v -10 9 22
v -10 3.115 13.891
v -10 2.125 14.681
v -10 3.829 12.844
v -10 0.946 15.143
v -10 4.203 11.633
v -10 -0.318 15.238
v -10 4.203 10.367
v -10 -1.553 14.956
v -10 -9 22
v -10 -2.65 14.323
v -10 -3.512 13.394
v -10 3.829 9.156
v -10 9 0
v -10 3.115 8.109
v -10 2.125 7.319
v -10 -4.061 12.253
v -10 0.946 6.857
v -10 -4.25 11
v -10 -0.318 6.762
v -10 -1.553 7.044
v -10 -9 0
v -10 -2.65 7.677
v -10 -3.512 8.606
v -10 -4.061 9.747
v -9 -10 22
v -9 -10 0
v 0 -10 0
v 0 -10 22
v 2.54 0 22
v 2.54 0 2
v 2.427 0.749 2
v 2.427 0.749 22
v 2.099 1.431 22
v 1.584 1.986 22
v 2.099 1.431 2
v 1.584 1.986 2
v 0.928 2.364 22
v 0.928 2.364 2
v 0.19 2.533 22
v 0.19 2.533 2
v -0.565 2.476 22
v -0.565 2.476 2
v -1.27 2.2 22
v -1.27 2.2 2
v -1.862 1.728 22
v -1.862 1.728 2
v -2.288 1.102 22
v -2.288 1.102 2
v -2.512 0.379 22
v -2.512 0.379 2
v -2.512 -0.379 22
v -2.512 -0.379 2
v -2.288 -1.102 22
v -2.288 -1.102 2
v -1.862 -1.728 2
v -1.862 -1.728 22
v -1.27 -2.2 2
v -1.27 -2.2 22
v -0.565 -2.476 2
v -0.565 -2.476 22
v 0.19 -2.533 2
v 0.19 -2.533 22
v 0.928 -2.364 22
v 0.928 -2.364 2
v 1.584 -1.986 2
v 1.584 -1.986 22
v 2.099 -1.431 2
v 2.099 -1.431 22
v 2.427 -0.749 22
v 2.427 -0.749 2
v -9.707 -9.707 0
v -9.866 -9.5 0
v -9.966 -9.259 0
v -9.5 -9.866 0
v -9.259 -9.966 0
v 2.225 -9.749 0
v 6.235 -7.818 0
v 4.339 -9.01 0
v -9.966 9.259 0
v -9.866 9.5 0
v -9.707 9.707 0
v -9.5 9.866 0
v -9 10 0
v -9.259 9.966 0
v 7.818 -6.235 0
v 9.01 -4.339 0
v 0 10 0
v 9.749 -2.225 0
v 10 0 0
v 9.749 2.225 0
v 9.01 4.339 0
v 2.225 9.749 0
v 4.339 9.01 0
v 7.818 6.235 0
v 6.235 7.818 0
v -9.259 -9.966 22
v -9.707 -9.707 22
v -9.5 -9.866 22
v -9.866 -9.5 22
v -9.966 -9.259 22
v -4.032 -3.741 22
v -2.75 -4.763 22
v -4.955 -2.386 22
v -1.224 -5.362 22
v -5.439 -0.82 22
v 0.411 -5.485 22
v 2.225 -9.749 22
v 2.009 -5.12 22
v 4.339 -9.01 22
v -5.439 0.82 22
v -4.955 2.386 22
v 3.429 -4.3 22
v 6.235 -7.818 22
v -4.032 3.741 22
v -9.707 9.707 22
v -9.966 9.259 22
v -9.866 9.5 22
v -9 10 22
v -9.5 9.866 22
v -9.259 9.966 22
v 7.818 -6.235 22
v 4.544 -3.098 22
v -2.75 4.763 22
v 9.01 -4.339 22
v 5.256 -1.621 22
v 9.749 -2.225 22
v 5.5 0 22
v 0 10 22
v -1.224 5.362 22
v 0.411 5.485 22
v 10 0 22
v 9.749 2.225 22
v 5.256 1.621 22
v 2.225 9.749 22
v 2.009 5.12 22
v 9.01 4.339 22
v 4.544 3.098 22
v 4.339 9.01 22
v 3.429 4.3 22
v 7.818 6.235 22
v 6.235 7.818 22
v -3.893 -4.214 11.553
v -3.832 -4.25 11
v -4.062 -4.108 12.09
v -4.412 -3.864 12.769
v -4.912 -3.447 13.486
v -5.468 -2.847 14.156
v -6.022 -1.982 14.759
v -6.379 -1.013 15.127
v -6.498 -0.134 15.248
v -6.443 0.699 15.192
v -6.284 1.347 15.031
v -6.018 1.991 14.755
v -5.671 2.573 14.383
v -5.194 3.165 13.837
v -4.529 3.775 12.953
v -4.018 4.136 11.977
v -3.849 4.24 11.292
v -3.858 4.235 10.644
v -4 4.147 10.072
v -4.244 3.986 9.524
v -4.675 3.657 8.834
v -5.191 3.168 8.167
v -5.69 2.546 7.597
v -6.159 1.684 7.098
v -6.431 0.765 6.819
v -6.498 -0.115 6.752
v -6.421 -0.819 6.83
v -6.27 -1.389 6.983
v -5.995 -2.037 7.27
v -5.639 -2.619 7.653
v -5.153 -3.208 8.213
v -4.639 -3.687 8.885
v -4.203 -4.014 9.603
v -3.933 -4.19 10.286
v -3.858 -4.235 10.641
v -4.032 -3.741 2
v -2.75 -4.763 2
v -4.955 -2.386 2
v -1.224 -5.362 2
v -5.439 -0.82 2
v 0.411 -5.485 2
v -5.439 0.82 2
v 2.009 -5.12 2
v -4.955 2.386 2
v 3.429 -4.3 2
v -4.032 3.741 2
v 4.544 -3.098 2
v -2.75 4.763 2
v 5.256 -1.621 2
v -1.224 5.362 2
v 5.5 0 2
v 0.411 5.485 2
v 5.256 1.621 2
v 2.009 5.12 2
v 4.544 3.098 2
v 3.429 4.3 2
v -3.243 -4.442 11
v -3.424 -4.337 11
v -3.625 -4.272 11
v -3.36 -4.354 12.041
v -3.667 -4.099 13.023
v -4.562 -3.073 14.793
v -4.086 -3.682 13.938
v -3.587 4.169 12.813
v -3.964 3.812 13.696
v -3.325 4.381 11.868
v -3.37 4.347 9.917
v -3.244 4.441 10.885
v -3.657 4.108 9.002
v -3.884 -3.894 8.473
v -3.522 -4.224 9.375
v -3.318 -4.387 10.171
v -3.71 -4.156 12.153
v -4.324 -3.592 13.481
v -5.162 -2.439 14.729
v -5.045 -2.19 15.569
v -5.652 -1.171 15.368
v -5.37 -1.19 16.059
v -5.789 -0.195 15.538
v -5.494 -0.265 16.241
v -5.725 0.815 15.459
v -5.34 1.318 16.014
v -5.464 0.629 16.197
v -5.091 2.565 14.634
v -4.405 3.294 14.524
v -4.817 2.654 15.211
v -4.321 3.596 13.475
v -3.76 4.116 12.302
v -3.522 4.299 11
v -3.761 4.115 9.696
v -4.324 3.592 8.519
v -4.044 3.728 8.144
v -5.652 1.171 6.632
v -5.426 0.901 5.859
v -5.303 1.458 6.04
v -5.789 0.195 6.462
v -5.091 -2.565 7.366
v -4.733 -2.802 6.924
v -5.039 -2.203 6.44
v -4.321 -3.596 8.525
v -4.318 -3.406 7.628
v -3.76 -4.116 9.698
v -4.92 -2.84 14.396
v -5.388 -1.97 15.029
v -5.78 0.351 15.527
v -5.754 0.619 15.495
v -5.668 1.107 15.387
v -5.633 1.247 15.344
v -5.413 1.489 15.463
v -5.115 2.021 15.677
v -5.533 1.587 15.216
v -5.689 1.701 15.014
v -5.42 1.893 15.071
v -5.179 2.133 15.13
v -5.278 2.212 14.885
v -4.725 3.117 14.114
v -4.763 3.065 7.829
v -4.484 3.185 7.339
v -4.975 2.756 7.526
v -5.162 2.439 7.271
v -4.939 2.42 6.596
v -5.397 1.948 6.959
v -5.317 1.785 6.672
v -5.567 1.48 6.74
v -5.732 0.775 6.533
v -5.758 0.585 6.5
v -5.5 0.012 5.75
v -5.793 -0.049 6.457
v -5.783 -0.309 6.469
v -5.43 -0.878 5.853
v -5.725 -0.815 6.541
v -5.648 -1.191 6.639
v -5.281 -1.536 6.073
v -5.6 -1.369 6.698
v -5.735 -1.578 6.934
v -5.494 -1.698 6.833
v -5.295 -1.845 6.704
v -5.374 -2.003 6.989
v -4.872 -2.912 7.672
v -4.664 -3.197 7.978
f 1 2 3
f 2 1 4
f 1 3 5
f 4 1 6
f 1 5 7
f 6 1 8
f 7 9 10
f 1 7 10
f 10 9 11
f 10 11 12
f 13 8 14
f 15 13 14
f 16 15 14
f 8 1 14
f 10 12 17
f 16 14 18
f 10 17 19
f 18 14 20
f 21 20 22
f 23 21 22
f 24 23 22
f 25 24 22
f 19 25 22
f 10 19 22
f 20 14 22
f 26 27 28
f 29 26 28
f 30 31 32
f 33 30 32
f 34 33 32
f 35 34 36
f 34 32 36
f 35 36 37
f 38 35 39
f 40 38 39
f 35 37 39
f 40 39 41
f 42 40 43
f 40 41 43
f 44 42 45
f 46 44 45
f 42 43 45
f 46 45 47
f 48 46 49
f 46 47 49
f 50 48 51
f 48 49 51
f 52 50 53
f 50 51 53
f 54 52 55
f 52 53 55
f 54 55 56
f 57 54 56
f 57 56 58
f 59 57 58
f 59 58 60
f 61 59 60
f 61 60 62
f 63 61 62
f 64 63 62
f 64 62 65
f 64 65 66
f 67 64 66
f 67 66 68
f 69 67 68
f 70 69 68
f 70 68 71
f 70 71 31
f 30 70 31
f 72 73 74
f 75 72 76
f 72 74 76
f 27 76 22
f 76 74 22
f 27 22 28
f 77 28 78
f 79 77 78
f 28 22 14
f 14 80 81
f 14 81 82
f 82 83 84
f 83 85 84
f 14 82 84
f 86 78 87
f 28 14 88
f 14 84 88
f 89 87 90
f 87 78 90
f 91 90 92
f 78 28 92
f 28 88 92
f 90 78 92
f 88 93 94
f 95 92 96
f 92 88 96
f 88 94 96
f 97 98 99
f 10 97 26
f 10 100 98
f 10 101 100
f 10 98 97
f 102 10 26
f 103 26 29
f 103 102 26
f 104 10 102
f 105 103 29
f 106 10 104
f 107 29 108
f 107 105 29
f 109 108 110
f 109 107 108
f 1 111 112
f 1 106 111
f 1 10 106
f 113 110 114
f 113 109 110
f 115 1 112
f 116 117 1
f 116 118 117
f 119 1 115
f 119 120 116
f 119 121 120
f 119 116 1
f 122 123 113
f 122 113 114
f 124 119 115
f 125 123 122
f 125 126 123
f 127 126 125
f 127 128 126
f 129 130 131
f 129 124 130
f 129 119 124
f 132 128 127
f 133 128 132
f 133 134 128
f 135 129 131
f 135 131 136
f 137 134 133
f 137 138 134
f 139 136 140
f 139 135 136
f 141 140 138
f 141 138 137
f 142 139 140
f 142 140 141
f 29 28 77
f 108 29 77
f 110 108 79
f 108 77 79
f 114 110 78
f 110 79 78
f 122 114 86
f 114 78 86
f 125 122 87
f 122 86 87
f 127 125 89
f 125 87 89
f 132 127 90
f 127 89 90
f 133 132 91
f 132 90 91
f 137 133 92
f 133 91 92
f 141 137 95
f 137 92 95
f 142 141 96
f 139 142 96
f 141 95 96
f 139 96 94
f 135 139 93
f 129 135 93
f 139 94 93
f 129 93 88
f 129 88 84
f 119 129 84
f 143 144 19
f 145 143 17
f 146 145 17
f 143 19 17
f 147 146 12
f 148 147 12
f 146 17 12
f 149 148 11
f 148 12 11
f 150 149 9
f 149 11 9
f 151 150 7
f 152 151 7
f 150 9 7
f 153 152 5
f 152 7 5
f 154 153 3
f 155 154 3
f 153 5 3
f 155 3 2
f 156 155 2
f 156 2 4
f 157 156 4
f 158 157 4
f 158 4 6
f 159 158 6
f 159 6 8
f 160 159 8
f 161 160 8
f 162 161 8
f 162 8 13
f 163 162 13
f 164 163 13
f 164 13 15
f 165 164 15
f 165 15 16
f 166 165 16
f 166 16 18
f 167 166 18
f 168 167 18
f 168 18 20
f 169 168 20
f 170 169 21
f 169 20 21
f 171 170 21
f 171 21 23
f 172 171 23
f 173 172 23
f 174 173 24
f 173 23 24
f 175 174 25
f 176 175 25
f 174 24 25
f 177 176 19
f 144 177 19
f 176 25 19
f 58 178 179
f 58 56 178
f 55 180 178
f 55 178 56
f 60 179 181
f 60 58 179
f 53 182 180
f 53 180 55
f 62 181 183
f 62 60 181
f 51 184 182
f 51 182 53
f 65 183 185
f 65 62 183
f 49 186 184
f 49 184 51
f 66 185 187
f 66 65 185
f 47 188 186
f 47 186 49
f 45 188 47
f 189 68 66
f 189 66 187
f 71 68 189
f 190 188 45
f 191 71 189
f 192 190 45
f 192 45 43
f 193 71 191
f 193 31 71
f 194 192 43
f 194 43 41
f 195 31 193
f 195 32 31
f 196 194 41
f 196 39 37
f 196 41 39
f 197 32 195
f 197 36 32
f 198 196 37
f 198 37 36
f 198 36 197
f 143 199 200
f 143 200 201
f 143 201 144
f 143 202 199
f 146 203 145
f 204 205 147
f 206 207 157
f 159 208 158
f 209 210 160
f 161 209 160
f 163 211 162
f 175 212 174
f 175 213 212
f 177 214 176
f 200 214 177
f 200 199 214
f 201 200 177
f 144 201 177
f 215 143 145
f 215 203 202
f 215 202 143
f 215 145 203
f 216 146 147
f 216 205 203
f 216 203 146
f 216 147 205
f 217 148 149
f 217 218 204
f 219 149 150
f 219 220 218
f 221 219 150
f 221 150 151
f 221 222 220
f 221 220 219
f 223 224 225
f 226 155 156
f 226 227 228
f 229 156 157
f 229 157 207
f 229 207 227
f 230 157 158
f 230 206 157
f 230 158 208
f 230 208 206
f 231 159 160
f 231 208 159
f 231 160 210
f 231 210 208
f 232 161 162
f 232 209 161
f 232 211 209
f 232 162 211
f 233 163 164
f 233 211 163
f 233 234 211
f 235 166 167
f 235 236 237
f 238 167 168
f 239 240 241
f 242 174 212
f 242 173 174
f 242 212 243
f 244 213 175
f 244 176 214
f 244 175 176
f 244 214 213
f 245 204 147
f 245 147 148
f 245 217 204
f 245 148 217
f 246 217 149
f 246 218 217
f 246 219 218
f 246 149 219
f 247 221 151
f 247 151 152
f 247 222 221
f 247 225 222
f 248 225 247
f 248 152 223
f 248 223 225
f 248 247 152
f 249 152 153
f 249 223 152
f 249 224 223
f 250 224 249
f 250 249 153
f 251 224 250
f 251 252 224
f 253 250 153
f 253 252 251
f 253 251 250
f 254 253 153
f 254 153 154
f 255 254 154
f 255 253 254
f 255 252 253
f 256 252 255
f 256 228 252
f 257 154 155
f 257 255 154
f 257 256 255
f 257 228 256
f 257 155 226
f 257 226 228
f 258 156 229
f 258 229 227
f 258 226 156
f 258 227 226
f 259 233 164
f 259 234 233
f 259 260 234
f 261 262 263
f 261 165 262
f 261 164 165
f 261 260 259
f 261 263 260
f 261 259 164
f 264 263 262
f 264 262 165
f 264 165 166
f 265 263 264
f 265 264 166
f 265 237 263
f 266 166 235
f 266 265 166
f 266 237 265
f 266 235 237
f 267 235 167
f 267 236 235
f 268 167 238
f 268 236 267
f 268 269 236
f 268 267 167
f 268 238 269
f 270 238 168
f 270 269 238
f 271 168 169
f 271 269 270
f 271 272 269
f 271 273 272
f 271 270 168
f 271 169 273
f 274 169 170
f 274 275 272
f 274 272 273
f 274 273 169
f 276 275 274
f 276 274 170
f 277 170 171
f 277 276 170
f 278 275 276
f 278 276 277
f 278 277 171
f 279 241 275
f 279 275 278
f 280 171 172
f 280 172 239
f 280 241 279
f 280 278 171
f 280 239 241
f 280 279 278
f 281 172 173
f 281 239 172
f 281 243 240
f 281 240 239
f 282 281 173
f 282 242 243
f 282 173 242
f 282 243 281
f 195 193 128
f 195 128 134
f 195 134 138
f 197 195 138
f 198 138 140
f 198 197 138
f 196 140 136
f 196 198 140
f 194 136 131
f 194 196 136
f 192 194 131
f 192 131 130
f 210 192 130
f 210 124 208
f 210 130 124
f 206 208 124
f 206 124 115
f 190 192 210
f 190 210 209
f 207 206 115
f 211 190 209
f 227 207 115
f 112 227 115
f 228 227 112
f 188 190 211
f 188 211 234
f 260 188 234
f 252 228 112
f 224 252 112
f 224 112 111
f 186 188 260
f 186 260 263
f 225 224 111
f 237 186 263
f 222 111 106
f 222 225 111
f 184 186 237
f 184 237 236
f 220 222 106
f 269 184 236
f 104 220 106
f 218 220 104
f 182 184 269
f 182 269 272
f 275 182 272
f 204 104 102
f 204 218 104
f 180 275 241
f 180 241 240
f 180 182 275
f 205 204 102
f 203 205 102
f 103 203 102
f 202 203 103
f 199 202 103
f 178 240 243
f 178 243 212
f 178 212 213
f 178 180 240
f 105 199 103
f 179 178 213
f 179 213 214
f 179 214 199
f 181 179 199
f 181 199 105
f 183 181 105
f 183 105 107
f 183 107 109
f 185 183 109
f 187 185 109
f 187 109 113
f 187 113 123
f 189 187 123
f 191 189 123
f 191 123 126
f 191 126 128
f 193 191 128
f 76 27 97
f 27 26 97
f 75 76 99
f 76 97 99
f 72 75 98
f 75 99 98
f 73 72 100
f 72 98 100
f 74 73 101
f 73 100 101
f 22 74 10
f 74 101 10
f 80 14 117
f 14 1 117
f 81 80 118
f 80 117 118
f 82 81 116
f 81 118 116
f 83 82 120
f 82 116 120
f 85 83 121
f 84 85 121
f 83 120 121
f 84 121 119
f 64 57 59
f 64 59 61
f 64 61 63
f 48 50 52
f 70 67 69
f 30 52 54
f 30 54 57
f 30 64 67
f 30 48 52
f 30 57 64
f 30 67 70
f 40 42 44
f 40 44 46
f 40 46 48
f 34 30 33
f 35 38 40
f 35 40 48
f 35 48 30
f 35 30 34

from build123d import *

# Parameters (mm, degrees)
F0_R     = 5.5
F1_DEPTH = 22
F0_R_2   = 2.54
F2_DEPTH = 2
F3_R     = 4.25
F4_DEPTH = 10
F5_DEPTH = 22
F6_R     = 1


with BuildPart() as f1:
    # F0 (on Top) → F1 (new body)
    with BuildSketch(Plane.XY):
        with BuildLine():
            Line((-10, -10), (0, -10))
            ThreePointArc((0, -10), (10, 0), (0, 10))
            Line((0, 10), (-10, 10))
            Line((-10, 10), (-10, -10))
        make_face()
        Circle(F0_R, mode=Mode.SUBTRACT)
    extrude(amount=F1_DEPTH)

    # F0 (on Top) → F2 (join)
    with BuildSketch(Plane.XY):
        Circle(F0_R)
        Circle(F0_R_2, mode=Mode.SUBTRACT)
    extrude(amount=F2_DEPTH)

    # F3 (on face) → F4 (cut)
    with BuildSketch(Plane(origin=(-10, 0, 0), x_dir=(0, -1, 0), z_dir=(-1, 0, 0))):
        with Locations((0, 11)):
            Circle(F3_R)
    extrude(amount=-F4_DEPTH, mode=Mode.SUBTRACT)

    # F0 (on Top) → F5 (join)
    with BuildSketch(Plane.XY):
        Circle(F0_R_2)
    extrude(amount=F5_DEPTH)

    # F6
    f6_edges = [f1.edges().sort_by_distance(p)[0] for p in [
        (-10, -10, 11),
        (-10, 10, 11),
        (-3.49106, 4.25, 11),
    ]]
    fillet(f6_edges, radius=F6_R)


solid = f1.part
